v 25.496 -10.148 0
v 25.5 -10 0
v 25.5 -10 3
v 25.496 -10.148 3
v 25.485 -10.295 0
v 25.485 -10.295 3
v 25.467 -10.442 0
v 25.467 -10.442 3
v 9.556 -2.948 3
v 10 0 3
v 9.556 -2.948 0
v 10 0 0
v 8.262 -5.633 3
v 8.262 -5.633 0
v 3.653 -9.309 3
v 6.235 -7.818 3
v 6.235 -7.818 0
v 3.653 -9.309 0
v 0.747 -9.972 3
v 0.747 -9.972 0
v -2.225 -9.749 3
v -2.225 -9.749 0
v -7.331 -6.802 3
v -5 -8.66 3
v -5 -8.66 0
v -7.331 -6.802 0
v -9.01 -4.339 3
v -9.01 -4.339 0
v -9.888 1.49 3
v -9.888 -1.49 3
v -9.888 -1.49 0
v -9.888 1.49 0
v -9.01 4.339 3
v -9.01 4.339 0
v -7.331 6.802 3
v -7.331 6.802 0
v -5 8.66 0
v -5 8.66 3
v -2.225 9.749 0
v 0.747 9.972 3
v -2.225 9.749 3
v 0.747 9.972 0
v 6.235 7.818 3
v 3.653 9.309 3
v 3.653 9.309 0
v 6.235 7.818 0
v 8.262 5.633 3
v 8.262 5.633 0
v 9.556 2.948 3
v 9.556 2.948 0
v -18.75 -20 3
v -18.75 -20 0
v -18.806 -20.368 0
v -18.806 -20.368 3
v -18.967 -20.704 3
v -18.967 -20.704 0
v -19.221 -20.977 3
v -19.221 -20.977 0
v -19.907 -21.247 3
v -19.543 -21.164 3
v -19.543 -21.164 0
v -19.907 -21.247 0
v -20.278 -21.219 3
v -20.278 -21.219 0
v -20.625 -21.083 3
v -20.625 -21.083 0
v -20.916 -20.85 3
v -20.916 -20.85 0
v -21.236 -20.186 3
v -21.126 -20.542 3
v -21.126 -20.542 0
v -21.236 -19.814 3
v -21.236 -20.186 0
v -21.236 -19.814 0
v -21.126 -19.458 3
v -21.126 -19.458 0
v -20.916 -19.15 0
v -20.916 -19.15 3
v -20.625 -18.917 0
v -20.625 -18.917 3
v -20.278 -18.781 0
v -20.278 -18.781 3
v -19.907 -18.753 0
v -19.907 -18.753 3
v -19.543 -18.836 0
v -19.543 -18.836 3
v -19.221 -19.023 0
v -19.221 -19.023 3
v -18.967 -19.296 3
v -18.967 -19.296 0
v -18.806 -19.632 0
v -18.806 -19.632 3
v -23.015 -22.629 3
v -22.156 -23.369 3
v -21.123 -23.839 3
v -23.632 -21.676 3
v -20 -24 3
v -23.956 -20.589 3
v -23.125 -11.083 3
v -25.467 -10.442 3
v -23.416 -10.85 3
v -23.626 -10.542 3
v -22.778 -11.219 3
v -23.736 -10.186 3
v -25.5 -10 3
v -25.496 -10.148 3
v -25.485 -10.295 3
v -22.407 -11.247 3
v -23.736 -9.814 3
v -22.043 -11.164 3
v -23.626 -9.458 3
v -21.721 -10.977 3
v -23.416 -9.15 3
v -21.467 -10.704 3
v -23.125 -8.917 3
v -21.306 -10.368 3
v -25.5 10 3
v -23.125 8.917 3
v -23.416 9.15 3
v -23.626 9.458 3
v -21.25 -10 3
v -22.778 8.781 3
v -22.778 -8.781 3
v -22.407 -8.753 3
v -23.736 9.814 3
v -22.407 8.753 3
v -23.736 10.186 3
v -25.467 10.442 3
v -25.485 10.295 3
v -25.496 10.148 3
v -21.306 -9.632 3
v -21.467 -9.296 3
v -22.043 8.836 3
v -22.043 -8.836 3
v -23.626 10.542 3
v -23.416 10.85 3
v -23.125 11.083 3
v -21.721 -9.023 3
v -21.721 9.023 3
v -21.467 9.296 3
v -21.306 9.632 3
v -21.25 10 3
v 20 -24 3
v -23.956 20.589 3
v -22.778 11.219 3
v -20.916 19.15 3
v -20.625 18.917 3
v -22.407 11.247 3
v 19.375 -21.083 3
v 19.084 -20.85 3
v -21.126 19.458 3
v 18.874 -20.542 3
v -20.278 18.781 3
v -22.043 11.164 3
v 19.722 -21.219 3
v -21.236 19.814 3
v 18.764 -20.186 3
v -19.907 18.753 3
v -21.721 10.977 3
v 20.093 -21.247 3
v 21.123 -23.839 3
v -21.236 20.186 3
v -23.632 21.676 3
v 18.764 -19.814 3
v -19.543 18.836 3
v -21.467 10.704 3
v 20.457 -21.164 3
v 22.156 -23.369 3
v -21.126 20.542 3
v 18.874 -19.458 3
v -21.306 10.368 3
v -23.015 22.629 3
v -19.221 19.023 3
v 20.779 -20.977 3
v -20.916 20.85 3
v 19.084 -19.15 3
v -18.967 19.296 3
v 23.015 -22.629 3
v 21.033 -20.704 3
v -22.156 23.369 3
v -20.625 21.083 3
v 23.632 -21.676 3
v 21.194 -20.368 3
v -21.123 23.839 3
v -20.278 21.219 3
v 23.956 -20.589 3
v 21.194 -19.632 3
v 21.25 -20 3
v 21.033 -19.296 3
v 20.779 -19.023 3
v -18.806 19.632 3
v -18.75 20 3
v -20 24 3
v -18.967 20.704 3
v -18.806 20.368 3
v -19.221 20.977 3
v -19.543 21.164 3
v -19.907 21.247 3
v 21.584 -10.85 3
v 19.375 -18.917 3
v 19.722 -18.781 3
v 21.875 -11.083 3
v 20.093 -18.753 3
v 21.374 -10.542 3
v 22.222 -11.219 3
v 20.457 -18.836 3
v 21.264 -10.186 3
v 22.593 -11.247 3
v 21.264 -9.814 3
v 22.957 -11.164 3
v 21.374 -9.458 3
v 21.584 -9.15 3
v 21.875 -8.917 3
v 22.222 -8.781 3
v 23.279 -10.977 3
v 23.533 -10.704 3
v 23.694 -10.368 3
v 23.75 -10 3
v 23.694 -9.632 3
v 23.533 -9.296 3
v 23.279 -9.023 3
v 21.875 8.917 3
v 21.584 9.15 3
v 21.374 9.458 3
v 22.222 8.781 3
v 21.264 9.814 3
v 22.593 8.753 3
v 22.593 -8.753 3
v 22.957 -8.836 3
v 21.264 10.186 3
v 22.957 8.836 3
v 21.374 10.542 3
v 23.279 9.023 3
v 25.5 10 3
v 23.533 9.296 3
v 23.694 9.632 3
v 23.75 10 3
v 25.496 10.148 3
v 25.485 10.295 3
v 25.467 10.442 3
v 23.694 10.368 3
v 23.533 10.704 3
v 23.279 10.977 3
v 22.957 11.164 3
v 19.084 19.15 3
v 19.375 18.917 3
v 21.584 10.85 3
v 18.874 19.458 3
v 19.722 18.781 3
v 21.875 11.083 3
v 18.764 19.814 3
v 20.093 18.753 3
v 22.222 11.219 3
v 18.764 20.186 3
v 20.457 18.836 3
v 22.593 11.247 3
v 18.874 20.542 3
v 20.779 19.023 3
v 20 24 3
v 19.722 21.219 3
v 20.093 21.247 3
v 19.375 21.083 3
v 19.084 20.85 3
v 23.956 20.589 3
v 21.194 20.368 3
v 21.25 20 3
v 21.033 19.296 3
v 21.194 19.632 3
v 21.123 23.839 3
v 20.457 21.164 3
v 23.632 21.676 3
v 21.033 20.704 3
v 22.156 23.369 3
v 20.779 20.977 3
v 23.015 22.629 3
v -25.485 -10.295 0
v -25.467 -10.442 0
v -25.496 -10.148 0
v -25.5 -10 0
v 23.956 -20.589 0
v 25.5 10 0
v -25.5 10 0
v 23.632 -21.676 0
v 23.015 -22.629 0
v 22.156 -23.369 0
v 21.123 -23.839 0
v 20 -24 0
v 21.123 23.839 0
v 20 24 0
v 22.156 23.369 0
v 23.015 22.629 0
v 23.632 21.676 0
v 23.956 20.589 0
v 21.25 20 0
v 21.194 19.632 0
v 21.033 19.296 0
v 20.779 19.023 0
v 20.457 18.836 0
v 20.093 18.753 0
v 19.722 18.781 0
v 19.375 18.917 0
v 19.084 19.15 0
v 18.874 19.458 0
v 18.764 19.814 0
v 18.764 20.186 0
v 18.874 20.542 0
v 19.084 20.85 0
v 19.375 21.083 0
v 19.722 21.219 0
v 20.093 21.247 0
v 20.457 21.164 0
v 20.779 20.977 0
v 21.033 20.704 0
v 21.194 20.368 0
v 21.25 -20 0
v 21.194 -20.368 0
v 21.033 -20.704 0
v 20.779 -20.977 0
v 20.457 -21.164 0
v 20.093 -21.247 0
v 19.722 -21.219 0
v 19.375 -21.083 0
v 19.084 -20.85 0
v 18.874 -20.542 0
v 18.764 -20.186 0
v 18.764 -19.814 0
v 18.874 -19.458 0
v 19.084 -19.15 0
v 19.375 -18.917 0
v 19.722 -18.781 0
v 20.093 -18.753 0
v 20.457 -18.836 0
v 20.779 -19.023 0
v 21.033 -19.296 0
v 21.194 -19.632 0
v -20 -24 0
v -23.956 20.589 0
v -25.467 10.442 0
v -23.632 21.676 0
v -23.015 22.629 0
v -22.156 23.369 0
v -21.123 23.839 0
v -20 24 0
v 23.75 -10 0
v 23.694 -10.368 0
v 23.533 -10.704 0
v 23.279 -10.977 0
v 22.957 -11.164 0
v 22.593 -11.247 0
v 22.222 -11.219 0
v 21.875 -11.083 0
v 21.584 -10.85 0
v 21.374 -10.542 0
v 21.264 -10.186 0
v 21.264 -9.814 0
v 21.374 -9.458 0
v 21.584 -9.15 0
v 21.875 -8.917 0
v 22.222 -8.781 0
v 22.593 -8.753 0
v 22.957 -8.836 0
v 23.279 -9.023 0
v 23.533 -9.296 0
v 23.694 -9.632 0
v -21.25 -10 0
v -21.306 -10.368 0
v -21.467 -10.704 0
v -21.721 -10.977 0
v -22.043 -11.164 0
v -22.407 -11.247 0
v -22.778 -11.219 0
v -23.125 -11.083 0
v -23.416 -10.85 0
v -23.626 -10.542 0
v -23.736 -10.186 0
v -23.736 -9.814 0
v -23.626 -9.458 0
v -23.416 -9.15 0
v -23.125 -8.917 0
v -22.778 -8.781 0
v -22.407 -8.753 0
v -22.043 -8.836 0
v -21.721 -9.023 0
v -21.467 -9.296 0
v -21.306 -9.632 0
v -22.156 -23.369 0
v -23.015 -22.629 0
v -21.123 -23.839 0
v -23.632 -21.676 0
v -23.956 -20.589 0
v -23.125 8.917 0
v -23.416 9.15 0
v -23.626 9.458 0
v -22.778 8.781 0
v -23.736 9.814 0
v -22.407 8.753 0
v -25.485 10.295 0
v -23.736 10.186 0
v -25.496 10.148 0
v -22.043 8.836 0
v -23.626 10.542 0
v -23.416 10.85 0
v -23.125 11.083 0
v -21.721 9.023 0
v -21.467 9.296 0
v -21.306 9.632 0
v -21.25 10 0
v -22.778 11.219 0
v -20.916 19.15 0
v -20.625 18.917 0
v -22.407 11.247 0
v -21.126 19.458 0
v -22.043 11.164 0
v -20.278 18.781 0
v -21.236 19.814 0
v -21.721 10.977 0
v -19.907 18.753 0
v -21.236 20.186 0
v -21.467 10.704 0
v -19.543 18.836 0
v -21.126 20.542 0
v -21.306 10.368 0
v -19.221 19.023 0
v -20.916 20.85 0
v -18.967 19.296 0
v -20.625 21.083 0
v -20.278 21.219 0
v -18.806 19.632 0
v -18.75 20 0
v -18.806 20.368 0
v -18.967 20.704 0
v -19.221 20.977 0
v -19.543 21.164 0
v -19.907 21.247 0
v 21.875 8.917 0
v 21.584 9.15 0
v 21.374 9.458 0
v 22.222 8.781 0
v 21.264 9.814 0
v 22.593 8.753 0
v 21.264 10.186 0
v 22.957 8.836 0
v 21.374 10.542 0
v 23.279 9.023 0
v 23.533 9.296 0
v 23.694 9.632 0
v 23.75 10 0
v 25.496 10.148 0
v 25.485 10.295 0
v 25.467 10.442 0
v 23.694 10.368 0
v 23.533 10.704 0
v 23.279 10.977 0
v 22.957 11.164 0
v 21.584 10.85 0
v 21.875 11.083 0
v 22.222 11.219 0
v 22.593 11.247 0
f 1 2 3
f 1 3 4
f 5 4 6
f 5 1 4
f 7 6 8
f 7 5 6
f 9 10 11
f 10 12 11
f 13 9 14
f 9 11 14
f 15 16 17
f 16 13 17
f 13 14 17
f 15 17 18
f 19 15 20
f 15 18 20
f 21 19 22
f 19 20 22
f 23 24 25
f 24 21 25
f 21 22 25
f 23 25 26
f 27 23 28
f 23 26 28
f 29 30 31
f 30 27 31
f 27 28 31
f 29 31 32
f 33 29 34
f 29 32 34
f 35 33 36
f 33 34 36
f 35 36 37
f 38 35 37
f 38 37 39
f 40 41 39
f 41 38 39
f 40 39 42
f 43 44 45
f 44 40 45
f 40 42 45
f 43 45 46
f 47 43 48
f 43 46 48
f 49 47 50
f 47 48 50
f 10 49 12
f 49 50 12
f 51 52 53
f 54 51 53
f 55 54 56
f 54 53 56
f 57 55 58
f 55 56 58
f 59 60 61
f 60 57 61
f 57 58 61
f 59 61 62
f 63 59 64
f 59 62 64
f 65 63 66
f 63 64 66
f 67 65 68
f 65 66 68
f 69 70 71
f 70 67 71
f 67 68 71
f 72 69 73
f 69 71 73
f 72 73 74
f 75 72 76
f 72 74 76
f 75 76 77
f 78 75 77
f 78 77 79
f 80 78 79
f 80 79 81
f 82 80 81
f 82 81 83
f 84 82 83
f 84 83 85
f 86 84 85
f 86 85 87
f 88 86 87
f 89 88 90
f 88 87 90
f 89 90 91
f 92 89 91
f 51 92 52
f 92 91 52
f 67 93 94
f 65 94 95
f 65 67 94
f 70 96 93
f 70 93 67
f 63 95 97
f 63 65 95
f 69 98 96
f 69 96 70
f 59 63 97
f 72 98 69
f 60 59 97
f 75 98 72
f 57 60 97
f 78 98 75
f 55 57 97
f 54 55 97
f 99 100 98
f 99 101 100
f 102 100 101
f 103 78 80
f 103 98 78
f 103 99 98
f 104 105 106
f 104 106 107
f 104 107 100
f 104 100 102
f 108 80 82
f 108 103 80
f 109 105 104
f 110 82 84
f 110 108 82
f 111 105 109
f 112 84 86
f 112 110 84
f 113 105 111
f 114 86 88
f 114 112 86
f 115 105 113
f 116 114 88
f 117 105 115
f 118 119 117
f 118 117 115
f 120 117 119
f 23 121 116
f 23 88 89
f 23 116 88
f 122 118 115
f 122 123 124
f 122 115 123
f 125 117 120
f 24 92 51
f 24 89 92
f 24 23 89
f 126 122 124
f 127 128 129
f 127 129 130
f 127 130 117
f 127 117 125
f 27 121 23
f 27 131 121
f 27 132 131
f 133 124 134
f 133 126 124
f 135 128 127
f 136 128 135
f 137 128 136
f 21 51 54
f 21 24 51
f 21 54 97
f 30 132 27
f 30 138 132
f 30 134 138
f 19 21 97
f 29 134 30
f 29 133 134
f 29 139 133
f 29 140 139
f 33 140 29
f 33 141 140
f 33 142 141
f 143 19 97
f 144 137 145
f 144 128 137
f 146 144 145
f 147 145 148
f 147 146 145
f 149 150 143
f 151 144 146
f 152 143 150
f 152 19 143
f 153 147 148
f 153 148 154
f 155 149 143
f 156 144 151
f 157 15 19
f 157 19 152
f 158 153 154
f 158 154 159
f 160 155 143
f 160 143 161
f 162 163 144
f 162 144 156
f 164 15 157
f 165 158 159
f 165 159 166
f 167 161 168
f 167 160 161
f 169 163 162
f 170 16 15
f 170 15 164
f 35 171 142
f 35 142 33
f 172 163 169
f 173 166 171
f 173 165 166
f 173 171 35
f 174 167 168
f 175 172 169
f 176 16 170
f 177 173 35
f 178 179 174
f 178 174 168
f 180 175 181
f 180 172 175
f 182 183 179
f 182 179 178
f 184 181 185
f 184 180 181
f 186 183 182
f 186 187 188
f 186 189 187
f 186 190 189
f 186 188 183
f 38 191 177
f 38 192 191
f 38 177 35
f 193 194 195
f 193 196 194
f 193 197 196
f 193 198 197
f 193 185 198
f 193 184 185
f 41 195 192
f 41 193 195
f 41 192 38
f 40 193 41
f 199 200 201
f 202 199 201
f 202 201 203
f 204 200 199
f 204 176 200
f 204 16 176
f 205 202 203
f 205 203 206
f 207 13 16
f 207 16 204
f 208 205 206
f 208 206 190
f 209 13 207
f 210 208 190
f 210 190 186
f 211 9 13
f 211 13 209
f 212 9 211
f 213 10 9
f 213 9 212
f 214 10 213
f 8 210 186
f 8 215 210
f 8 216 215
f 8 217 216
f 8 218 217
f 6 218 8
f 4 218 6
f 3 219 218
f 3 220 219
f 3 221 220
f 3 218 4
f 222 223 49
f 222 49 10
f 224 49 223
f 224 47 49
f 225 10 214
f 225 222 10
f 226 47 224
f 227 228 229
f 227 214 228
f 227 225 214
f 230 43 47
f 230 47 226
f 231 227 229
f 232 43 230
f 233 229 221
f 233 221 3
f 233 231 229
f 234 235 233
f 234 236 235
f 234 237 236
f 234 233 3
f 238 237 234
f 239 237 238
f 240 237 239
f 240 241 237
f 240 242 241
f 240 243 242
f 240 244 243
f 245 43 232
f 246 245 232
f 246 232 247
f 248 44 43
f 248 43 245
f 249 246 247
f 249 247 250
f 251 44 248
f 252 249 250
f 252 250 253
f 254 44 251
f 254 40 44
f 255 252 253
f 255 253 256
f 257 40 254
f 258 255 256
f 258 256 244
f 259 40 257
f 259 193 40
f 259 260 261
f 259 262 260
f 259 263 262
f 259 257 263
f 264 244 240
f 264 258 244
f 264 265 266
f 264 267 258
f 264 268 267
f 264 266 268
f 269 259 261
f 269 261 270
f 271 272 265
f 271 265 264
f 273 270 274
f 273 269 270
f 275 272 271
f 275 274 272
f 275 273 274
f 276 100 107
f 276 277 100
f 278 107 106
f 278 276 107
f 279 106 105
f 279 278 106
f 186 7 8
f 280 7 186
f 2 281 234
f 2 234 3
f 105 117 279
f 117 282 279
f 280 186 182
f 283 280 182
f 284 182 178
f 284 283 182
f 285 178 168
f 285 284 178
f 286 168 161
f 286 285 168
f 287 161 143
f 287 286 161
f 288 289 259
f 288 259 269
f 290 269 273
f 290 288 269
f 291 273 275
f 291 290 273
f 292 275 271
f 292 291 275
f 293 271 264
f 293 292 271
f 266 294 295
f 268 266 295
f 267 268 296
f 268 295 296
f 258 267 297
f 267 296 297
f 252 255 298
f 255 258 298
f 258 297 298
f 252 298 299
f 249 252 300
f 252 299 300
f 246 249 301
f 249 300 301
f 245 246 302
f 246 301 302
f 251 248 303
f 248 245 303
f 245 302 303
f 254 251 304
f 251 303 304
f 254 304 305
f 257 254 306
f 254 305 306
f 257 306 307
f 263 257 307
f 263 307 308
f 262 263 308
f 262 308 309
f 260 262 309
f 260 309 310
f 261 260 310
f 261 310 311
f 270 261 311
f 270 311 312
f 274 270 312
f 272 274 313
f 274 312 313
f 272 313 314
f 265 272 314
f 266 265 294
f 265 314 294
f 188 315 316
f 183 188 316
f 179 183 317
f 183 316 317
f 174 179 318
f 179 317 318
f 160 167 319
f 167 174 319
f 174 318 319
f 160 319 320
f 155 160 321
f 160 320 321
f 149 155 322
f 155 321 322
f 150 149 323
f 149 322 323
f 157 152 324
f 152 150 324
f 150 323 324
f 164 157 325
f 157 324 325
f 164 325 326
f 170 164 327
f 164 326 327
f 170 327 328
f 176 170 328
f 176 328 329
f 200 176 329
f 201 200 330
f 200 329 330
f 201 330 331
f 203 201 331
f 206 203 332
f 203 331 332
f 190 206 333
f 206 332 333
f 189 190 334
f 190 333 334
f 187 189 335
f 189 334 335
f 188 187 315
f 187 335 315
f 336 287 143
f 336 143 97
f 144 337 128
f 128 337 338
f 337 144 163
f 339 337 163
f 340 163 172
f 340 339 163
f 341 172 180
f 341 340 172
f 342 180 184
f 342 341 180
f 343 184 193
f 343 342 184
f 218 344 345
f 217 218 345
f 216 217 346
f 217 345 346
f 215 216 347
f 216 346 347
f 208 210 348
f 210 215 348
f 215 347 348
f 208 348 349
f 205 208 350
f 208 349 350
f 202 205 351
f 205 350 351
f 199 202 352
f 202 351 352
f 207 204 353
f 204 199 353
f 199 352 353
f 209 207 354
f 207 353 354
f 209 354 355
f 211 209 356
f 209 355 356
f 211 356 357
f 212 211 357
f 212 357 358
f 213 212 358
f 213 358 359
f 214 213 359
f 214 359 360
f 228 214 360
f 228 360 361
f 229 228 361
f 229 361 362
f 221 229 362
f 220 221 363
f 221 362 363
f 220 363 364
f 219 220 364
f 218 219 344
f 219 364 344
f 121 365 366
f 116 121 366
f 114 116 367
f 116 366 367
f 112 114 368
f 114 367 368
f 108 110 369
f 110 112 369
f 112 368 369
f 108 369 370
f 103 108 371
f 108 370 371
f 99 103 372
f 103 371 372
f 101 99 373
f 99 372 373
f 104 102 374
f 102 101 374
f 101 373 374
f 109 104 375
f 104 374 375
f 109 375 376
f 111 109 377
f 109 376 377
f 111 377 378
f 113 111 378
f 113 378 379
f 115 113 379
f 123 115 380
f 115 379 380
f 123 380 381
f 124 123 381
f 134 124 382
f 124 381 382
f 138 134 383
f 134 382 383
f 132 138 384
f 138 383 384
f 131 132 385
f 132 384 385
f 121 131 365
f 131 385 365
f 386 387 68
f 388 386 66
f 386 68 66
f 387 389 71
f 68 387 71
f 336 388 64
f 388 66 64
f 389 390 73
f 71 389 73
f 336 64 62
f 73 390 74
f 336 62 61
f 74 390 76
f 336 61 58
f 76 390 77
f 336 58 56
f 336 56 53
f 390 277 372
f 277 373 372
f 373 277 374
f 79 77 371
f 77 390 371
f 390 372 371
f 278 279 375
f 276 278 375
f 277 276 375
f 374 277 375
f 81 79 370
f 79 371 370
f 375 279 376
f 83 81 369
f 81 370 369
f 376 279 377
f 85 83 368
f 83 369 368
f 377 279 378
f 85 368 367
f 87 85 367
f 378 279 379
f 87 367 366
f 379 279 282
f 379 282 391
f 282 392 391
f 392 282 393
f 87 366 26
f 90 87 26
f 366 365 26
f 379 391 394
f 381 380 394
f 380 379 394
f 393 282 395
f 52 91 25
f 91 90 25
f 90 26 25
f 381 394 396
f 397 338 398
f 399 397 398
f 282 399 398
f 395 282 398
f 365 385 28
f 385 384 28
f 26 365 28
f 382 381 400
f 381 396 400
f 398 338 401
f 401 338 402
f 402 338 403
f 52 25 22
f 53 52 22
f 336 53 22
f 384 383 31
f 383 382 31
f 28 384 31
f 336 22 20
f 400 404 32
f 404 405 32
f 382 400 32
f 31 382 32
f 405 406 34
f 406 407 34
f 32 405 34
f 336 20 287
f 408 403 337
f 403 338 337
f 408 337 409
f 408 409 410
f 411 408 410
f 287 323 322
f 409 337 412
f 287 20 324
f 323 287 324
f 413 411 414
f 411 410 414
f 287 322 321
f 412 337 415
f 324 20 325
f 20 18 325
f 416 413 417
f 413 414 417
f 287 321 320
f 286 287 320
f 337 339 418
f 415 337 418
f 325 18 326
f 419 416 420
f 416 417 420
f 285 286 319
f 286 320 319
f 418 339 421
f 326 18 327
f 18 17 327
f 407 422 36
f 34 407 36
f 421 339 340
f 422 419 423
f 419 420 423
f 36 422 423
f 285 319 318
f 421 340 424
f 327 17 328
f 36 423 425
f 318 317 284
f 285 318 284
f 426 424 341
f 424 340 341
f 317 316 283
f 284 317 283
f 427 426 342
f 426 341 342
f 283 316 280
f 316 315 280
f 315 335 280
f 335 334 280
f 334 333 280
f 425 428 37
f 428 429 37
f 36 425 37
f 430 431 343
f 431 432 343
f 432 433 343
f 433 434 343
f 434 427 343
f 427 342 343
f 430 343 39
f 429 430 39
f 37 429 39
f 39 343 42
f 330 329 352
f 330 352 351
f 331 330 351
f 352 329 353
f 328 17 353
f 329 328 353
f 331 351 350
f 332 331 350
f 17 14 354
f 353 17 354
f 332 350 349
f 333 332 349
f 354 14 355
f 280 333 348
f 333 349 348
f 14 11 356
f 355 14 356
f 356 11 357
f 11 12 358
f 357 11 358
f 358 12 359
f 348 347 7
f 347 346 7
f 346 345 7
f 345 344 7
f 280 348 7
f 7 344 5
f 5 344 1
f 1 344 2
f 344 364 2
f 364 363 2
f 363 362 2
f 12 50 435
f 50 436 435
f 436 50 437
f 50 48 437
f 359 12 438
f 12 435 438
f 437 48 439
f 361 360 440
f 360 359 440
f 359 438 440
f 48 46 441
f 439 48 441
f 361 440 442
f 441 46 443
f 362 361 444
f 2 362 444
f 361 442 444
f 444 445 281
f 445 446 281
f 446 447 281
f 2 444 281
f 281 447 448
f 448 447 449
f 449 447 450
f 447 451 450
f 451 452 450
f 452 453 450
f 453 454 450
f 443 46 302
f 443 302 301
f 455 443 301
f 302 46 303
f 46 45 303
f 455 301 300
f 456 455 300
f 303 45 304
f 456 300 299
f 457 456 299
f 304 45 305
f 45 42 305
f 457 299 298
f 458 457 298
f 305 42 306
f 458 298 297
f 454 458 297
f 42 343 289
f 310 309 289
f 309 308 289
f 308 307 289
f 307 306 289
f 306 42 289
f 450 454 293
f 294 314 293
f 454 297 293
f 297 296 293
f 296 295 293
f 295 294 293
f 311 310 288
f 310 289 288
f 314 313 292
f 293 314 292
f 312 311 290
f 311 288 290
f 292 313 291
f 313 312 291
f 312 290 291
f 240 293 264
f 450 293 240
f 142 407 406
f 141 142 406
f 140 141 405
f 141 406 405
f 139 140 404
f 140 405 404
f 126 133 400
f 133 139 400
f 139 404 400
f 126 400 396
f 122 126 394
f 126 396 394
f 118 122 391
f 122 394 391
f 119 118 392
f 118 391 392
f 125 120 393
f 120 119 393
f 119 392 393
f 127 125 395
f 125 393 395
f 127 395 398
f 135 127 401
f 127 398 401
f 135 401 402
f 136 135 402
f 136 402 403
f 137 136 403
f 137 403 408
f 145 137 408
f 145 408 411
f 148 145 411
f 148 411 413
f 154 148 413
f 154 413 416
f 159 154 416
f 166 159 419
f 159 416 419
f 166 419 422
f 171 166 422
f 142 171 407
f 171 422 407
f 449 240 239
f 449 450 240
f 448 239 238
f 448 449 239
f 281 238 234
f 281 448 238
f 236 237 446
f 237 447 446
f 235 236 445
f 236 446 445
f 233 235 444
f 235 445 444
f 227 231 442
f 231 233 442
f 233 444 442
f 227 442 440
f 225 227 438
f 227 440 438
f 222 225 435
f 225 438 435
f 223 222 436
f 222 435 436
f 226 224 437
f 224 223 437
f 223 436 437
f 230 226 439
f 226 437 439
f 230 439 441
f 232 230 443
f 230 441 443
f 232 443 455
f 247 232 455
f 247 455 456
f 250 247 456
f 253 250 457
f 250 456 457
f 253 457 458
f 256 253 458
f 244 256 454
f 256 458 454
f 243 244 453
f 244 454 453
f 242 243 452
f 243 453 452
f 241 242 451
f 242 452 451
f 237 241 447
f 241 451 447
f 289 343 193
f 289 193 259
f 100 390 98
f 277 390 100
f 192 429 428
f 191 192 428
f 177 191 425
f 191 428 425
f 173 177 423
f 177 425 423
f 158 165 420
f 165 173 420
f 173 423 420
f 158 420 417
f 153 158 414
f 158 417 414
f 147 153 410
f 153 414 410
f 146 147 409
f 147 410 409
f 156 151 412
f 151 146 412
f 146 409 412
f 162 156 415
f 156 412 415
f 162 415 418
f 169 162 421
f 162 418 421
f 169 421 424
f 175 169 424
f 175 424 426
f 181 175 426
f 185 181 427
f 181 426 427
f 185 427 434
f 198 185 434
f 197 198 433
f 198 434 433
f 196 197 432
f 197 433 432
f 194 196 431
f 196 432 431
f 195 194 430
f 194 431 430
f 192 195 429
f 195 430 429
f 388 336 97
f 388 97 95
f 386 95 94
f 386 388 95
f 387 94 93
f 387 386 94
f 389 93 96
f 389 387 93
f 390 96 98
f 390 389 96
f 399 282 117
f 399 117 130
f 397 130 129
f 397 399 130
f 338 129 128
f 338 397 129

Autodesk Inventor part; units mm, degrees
ref_plane "YZ Plane" through (0, 0, 0) normal (1, 0, 0) x (0, 1, 0)
ref_plane "XZ Plane" through (0, 0, 0) normal (0, 1, 0) x (-1, 0, 0)
ref_plane "XY Plane" through (0, 0, 0) normal (0, 0, 1) x (1, 0, 0)
sketch "スケッチ1" plane through (0, 0, 0) normal (0, 0, 1) x (1, 0, 0)
  circle A0 centre (0, 0) radius 10
  line L0 (22.5, 10) -> (-22.5, 10) construction
  line L1 (-22.5, 10) -> (-22.5, -10) construction
  line L2 (-22.5, -10) -> (22.5, -10) construction
  line L3 (22.5, -10) -> (22.5, 10) construction
  line L4 (22.5, 10) -> (-22.5, -10) construction
  line L5 (-22.5, 10) -> (22.5, -10) construction
  circle A1 centre (-22.5, 10) radius 1.25
  circle A2 centre (-22.5, -10) radius 1.25
  circle A3 centre (22.5, 10) radius 1.25
  circle A4 centre (22.5, -10) radius 1.25
  circle A5 centre (0, 0) radius 25 construction
  line L6 (20, 20) -> (-20, 20) construction
  line L7 (-20, 20) -> (-20, -20) construction
  line L8 (-20, -20) -> (20, -20) construction
  line L9 (20, -20) -> (20, 20) construction
  line L10 (20, 20) -> (-20, -20) construction
  line L11 (-20, 20) -> (20, -20) construction
  circle A6 centre (-20, 20) radius 1.25
  circle A7 centre (20, 20) radius 1.25
  circle A8 centre (20, -20) radius 1.25
  circle A9 centre (-20, -20) radius 1.25
  arc A10 (-20, 24) -> (-23.9564, 20.5891) centre (-20, 20) ccw
  arc A11 (-25.4673, 10.4418) -> (-25.5, 10) centre (-22.5, 10) ccw
  arc A12 (-25.5, -10) -> (-25.4673, -10.4418) centre (-22.5, -10) ccw
  arc A13 (-23.9564, -20.5891) -> (-20, -24) centre (-20, -20) ccw
  arc A14 (20, -24) -> (23.9564, -20.5891) centre (20, -20) ccw
  arc A15 (25.4673, -10.4418) -> (25.5, -10) centre (22.5, -10) ccw
  arc A16 (25.5, 10) -> (25.4673, 10.4418) centre (22.5, 10) ccw
  arc A17 (23.9564, 20.5891) -> (20, 24) centre (20, 20) ccw
  line L12 (-23.9564, 20.5891) -> (-25.4673, 10.4418)
  line L13 (-20, 24) -> (20, 24)
  line L14 (23.9564, 20.5891) -> (25.4673, 10.4418)
  line L15 (25.5, 10) -> (25.5, -10)
  line L16 (25.4673, -10.4418) -> (23.9564, -20.5891)
  line L17 (20, -24) -> (-20, -24)
  line L18 (-23.9564, -20.5891) -> (-25.4673, -10.4418)
  line L19 (-25.5, 10) -> (-25.5, -10)
  dimension "d0" = 20
  dimension "d1" = 45
  dimension "d2" = 20
  dimension "d3" = 2.5
  dimension "d4" = 2.5
  dimension "d5" = 2.5
  dimension "d6" = 2.5
  dimension "d7" = 50
  dimension "d8" = 40
  dimension "d9" = 40
  dimension "d10" = 2.5
  dimension "d11" = 2.5
  dimension "d12" = 2.5
  dimension "d13" = 2.5
  dimension "d14" = 4
  dimension "d15" = 4
  dimension "d16" = 3
  dimension "d17" = 3
  dimension "d18" = 4
  dimension "d19" = 4
  dimension "d20" = 3
  dimension "d21" = 3
extrude "押し出し1" add sketch "スケッチ1" along normal blind 3
properties part number "関節3_775側_プーリ側板" material "アルミニウム 6061"
